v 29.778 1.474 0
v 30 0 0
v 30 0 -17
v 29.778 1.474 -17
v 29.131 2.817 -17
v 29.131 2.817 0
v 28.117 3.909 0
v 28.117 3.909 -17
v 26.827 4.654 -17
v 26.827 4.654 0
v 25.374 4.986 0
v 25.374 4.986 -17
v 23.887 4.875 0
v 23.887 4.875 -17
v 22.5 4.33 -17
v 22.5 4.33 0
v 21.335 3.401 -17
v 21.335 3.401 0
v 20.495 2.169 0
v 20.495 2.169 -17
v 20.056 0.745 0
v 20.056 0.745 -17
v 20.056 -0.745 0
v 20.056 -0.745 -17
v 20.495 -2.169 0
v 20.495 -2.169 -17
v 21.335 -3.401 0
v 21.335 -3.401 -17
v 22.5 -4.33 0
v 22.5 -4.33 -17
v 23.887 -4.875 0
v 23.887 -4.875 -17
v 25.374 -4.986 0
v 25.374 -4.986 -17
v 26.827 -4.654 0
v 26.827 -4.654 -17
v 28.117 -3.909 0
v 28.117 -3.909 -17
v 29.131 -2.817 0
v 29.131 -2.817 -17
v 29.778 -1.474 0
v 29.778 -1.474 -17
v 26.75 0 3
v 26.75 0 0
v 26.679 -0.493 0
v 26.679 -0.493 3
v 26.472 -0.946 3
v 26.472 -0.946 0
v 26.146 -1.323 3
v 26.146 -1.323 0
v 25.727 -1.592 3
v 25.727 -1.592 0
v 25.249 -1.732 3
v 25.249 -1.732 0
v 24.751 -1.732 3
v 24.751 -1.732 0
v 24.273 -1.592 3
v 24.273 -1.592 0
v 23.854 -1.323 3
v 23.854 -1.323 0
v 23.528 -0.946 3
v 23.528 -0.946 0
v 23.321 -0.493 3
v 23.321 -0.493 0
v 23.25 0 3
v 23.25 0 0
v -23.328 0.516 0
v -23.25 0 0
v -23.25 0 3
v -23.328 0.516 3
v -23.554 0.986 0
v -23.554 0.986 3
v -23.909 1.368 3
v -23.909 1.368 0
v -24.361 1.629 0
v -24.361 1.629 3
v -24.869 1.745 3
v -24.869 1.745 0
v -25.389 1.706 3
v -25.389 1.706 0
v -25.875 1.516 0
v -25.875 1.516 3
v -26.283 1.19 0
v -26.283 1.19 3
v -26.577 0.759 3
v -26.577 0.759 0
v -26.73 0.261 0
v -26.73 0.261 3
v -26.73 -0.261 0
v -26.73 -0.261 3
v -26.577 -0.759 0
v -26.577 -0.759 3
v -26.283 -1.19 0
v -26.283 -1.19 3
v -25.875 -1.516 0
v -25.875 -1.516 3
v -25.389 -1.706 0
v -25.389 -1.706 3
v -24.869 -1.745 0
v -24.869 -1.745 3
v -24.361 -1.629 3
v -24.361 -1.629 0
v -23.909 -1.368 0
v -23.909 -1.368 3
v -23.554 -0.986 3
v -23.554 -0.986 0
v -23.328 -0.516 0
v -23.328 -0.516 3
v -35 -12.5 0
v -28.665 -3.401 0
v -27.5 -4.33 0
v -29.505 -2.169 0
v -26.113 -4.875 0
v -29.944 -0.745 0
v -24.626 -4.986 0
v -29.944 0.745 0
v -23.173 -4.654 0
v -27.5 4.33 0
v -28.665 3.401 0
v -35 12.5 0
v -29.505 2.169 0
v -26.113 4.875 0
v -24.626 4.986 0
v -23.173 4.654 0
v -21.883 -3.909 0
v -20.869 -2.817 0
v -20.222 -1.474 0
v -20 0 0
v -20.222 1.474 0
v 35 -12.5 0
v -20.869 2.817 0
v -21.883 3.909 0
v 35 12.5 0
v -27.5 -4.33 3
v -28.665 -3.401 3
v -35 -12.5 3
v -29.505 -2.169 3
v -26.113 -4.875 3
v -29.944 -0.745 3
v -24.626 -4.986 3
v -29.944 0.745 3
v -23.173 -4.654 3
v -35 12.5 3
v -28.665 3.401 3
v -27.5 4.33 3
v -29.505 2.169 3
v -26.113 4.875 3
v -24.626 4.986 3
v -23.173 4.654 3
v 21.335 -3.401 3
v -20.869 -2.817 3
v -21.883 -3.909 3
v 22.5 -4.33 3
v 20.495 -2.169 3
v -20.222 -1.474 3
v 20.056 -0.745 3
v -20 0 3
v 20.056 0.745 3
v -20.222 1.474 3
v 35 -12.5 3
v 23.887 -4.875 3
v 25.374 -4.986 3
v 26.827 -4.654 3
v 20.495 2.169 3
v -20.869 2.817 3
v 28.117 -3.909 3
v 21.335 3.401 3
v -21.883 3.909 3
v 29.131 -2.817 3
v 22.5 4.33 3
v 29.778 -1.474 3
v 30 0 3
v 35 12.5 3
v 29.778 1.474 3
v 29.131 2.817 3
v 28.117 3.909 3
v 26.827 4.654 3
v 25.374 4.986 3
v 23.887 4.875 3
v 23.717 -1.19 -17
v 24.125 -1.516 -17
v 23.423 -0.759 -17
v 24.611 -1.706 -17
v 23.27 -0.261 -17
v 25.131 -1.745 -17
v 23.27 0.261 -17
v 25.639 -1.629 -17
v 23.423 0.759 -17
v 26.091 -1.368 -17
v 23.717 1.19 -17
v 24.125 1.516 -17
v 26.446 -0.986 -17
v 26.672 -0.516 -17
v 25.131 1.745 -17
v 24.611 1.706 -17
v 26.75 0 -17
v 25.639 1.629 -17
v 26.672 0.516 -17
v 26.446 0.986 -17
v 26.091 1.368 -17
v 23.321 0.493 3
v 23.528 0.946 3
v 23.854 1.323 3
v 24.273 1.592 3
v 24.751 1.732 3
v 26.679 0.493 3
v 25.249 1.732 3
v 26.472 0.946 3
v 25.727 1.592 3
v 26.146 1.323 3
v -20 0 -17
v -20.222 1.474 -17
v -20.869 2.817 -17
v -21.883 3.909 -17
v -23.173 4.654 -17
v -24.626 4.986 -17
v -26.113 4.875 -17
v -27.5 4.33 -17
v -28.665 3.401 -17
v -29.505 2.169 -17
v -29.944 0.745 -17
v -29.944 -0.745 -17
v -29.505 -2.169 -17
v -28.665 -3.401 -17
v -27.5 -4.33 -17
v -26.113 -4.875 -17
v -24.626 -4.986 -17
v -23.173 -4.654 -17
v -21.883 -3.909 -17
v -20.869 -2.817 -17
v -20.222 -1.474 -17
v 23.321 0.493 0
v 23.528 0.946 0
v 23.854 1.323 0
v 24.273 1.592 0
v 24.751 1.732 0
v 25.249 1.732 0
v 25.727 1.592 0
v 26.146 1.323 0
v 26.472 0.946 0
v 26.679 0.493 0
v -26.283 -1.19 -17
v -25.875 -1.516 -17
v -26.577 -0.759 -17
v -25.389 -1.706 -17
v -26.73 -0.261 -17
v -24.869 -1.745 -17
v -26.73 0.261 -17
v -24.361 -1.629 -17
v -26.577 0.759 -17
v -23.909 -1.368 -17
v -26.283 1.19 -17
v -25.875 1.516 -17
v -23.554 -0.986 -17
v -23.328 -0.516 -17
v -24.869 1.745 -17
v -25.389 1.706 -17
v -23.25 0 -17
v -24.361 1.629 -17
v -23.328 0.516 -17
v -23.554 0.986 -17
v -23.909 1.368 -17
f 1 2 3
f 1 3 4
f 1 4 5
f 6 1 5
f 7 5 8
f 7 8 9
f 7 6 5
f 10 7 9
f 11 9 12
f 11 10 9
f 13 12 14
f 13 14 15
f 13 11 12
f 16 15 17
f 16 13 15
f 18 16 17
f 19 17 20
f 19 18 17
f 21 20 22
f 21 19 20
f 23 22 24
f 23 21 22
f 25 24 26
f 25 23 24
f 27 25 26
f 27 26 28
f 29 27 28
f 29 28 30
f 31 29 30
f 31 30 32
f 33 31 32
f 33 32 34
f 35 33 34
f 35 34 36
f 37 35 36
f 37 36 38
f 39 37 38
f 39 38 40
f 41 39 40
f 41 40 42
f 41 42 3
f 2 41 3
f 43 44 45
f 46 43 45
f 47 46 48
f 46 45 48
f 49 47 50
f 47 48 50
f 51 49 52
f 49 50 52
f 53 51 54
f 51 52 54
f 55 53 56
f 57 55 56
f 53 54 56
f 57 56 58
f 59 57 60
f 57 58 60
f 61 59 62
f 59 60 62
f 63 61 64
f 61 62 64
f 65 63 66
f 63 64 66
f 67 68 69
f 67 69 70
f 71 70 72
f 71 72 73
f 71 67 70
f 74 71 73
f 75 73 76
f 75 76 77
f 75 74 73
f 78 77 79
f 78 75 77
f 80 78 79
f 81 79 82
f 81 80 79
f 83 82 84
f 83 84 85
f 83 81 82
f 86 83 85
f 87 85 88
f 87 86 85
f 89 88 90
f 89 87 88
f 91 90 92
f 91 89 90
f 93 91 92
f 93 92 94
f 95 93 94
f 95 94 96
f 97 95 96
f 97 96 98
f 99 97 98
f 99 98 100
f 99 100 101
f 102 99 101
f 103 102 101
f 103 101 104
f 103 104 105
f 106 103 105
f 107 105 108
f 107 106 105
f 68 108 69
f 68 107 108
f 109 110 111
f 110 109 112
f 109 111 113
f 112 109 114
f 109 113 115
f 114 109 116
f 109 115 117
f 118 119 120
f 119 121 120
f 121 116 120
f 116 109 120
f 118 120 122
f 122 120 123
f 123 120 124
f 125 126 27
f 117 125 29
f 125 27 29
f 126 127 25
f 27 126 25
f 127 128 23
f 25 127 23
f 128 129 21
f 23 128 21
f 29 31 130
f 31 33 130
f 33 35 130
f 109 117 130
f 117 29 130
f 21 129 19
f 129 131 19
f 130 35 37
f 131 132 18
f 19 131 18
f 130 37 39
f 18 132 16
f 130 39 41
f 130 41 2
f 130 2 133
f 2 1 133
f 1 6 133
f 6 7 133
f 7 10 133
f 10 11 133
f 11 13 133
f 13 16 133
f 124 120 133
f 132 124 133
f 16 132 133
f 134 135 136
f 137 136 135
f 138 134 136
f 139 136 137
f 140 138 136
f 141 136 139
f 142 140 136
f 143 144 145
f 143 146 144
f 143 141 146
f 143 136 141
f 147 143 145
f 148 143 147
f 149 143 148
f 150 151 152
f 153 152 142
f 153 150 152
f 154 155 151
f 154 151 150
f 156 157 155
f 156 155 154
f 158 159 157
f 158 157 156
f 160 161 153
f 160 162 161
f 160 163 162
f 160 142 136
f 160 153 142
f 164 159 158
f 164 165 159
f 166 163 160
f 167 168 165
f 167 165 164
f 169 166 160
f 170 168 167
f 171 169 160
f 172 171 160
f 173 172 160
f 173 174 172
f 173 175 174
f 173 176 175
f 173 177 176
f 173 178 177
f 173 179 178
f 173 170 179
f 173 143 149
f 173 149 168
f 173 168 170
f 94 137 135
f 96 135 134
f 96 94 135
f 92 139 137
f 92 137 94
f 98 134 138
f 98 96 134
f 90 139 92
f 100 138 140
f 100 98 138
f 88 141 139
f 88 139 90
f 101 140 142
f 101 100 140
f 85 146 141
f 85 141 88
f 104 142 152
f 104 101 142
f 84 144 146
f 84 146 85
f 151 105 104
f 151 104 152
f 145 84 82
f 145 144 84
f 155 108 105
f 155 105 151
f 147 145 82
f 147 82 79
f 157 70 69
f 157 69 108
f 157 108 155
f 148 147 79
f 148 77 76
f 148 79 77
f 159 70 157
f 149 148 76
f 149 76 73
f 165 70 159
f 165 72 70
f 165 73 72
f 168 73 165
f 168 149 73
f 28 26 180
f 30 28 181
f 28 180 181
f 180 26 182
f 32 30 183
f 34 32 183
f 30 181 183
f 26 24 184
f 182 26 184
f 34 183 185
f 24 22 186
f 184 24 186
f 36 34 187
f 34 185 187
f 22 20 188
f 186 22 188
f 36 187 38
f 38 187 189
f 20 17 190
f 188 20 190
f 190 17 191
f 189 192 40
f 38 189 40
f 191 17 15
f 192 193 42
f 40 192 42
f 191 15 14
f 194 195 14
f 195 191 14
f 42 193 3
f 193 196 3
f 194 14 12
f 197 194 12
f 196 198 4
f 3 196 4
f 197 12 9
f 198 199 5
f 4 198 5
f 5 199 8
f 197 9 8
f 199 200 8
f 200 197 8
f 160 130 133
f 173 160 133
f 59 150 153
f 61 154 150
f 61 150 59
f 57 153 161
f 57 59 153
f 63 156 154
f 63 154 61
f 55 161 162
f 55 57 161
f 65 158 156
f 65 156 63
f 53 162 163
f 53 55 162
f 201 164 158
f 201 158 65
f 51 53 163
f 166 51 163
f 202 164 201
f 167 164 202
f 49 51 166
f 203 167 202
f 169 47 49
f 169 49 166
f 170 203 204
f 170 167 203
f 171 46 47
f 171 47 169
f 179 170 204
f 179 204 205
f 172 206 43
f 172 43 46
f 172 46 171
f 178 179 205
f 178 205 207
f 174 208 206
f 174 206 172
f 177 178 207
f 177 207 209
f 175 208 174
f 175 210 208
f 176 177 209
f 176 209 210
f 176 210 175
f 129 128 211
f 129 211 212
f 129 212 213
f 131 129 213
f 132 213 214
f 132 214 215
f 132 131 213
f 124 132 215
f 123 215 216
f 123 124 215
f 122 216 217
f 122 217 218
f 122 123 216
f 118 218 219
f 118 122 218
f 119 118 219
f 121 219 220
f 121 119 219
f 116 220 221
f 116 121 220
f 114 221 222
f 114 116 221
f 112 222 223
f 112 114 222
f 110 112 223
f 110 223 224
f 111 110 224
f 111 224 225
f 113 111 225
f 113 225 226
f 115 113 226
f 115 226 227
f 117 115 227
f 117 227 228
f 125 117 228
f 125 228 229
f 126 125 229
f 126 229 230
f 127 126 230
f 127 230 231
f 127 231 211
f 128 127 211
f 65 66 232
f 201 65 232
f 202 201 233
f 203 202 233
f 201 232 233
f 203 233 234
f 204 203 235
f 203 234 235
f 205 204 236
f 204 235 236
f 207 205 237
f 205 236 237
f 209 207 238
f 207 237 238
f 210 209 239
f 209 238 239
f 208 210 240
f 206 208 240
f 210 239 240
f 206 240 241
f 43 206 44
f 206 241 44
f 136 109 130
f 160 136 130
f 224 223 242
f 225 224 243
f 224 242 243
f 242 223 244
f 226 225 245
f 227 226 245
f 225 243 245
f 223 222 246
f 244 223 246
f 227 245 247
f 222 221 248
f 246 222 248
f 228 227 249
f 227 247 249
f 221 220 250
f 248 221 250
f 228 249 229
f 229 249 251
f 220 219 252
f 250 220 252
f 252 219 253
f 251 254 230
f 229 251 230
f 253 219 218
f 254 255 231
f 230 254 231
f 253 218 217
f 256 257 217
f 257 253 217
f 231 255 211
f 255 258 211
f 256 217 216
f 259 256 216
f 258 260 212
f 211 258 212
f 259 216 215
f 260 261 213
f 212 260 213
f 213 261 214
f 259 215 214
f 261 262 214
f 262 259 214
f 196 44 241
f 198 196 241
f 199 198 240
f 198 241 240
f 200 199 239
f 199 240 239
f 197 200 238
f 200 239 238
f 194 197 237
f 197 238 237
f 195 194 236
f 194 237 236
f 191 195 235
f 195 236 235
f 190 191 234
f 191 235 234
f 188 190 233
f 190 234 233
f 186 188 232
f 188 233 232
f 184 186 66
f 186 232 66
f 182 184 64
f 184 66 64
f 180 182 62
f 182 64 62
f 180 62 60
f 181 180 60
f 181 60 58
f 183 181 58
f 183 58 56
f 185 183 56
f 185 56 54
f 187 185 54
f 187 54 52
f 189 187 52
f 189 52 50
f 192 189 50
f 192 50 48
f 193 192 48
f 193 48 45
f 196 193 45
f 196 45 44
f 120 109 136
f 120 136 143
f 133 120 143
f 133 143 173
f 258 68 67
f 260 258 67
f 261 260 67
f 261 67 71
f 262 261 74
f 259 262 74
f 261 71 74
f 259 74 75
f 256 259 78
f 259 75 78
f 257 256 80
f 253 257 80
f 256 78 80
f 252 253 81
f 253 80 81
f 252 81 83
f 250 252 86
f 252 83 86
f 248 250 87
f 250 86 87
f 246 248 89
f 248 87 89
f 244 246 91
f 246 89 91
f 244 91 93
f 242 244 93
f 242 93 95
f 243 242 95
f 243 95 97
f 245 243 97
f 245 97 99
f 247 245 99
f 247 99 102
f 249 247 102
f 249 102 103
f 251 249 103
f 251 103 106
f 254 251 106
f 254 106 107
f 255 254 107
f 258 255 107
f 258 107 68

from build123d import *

# Parameters (mm, degrees)
F0_W     = 70
F0_H     = 25
F0_R     = 1.75
F1_DEPTH = 3
F2_R     = 5
F2_R_2   = 1.75
F3_DEPTH = 20


with BuildPart() as f1:
    # F0 (on Top) → F1 (new body)
    with BuildSketch(Plane.XY):
        Rectangle(F0_W, F0_H)
        with Locations((-25, 0)):
            Circle(F0_R, mode=Mode.SUBTRACT)
        with BuildLine():
            ThreePointArc((26.75, 0), (25, -1.75), (23.25, 0))
            ThreePointArc((23.25, 0), (25, 1.75), (26.75, 0))
        make_face(mode=Mode.SUBTRACT)
    extrude(amount=F1_DEPTH)

    # F2 (on face) → F3 (join)
    with BuildSketch(Plane.XY.offset(3)):
        with Locations((-25, 0)):
            Circle(F2_R)
        with Locations((-25, 0)):
            Circle(F2_R_2, mode=Mode.SUBTRACT)
        with Locations((25, 0)):
            Circle(F2_R)
        with Locations((25, 0)):
            Circle(F2_R_2, mode=Mode.SUBTRACT)
    extrude(amount=-F3_DEPTH)


solid = f1.part
